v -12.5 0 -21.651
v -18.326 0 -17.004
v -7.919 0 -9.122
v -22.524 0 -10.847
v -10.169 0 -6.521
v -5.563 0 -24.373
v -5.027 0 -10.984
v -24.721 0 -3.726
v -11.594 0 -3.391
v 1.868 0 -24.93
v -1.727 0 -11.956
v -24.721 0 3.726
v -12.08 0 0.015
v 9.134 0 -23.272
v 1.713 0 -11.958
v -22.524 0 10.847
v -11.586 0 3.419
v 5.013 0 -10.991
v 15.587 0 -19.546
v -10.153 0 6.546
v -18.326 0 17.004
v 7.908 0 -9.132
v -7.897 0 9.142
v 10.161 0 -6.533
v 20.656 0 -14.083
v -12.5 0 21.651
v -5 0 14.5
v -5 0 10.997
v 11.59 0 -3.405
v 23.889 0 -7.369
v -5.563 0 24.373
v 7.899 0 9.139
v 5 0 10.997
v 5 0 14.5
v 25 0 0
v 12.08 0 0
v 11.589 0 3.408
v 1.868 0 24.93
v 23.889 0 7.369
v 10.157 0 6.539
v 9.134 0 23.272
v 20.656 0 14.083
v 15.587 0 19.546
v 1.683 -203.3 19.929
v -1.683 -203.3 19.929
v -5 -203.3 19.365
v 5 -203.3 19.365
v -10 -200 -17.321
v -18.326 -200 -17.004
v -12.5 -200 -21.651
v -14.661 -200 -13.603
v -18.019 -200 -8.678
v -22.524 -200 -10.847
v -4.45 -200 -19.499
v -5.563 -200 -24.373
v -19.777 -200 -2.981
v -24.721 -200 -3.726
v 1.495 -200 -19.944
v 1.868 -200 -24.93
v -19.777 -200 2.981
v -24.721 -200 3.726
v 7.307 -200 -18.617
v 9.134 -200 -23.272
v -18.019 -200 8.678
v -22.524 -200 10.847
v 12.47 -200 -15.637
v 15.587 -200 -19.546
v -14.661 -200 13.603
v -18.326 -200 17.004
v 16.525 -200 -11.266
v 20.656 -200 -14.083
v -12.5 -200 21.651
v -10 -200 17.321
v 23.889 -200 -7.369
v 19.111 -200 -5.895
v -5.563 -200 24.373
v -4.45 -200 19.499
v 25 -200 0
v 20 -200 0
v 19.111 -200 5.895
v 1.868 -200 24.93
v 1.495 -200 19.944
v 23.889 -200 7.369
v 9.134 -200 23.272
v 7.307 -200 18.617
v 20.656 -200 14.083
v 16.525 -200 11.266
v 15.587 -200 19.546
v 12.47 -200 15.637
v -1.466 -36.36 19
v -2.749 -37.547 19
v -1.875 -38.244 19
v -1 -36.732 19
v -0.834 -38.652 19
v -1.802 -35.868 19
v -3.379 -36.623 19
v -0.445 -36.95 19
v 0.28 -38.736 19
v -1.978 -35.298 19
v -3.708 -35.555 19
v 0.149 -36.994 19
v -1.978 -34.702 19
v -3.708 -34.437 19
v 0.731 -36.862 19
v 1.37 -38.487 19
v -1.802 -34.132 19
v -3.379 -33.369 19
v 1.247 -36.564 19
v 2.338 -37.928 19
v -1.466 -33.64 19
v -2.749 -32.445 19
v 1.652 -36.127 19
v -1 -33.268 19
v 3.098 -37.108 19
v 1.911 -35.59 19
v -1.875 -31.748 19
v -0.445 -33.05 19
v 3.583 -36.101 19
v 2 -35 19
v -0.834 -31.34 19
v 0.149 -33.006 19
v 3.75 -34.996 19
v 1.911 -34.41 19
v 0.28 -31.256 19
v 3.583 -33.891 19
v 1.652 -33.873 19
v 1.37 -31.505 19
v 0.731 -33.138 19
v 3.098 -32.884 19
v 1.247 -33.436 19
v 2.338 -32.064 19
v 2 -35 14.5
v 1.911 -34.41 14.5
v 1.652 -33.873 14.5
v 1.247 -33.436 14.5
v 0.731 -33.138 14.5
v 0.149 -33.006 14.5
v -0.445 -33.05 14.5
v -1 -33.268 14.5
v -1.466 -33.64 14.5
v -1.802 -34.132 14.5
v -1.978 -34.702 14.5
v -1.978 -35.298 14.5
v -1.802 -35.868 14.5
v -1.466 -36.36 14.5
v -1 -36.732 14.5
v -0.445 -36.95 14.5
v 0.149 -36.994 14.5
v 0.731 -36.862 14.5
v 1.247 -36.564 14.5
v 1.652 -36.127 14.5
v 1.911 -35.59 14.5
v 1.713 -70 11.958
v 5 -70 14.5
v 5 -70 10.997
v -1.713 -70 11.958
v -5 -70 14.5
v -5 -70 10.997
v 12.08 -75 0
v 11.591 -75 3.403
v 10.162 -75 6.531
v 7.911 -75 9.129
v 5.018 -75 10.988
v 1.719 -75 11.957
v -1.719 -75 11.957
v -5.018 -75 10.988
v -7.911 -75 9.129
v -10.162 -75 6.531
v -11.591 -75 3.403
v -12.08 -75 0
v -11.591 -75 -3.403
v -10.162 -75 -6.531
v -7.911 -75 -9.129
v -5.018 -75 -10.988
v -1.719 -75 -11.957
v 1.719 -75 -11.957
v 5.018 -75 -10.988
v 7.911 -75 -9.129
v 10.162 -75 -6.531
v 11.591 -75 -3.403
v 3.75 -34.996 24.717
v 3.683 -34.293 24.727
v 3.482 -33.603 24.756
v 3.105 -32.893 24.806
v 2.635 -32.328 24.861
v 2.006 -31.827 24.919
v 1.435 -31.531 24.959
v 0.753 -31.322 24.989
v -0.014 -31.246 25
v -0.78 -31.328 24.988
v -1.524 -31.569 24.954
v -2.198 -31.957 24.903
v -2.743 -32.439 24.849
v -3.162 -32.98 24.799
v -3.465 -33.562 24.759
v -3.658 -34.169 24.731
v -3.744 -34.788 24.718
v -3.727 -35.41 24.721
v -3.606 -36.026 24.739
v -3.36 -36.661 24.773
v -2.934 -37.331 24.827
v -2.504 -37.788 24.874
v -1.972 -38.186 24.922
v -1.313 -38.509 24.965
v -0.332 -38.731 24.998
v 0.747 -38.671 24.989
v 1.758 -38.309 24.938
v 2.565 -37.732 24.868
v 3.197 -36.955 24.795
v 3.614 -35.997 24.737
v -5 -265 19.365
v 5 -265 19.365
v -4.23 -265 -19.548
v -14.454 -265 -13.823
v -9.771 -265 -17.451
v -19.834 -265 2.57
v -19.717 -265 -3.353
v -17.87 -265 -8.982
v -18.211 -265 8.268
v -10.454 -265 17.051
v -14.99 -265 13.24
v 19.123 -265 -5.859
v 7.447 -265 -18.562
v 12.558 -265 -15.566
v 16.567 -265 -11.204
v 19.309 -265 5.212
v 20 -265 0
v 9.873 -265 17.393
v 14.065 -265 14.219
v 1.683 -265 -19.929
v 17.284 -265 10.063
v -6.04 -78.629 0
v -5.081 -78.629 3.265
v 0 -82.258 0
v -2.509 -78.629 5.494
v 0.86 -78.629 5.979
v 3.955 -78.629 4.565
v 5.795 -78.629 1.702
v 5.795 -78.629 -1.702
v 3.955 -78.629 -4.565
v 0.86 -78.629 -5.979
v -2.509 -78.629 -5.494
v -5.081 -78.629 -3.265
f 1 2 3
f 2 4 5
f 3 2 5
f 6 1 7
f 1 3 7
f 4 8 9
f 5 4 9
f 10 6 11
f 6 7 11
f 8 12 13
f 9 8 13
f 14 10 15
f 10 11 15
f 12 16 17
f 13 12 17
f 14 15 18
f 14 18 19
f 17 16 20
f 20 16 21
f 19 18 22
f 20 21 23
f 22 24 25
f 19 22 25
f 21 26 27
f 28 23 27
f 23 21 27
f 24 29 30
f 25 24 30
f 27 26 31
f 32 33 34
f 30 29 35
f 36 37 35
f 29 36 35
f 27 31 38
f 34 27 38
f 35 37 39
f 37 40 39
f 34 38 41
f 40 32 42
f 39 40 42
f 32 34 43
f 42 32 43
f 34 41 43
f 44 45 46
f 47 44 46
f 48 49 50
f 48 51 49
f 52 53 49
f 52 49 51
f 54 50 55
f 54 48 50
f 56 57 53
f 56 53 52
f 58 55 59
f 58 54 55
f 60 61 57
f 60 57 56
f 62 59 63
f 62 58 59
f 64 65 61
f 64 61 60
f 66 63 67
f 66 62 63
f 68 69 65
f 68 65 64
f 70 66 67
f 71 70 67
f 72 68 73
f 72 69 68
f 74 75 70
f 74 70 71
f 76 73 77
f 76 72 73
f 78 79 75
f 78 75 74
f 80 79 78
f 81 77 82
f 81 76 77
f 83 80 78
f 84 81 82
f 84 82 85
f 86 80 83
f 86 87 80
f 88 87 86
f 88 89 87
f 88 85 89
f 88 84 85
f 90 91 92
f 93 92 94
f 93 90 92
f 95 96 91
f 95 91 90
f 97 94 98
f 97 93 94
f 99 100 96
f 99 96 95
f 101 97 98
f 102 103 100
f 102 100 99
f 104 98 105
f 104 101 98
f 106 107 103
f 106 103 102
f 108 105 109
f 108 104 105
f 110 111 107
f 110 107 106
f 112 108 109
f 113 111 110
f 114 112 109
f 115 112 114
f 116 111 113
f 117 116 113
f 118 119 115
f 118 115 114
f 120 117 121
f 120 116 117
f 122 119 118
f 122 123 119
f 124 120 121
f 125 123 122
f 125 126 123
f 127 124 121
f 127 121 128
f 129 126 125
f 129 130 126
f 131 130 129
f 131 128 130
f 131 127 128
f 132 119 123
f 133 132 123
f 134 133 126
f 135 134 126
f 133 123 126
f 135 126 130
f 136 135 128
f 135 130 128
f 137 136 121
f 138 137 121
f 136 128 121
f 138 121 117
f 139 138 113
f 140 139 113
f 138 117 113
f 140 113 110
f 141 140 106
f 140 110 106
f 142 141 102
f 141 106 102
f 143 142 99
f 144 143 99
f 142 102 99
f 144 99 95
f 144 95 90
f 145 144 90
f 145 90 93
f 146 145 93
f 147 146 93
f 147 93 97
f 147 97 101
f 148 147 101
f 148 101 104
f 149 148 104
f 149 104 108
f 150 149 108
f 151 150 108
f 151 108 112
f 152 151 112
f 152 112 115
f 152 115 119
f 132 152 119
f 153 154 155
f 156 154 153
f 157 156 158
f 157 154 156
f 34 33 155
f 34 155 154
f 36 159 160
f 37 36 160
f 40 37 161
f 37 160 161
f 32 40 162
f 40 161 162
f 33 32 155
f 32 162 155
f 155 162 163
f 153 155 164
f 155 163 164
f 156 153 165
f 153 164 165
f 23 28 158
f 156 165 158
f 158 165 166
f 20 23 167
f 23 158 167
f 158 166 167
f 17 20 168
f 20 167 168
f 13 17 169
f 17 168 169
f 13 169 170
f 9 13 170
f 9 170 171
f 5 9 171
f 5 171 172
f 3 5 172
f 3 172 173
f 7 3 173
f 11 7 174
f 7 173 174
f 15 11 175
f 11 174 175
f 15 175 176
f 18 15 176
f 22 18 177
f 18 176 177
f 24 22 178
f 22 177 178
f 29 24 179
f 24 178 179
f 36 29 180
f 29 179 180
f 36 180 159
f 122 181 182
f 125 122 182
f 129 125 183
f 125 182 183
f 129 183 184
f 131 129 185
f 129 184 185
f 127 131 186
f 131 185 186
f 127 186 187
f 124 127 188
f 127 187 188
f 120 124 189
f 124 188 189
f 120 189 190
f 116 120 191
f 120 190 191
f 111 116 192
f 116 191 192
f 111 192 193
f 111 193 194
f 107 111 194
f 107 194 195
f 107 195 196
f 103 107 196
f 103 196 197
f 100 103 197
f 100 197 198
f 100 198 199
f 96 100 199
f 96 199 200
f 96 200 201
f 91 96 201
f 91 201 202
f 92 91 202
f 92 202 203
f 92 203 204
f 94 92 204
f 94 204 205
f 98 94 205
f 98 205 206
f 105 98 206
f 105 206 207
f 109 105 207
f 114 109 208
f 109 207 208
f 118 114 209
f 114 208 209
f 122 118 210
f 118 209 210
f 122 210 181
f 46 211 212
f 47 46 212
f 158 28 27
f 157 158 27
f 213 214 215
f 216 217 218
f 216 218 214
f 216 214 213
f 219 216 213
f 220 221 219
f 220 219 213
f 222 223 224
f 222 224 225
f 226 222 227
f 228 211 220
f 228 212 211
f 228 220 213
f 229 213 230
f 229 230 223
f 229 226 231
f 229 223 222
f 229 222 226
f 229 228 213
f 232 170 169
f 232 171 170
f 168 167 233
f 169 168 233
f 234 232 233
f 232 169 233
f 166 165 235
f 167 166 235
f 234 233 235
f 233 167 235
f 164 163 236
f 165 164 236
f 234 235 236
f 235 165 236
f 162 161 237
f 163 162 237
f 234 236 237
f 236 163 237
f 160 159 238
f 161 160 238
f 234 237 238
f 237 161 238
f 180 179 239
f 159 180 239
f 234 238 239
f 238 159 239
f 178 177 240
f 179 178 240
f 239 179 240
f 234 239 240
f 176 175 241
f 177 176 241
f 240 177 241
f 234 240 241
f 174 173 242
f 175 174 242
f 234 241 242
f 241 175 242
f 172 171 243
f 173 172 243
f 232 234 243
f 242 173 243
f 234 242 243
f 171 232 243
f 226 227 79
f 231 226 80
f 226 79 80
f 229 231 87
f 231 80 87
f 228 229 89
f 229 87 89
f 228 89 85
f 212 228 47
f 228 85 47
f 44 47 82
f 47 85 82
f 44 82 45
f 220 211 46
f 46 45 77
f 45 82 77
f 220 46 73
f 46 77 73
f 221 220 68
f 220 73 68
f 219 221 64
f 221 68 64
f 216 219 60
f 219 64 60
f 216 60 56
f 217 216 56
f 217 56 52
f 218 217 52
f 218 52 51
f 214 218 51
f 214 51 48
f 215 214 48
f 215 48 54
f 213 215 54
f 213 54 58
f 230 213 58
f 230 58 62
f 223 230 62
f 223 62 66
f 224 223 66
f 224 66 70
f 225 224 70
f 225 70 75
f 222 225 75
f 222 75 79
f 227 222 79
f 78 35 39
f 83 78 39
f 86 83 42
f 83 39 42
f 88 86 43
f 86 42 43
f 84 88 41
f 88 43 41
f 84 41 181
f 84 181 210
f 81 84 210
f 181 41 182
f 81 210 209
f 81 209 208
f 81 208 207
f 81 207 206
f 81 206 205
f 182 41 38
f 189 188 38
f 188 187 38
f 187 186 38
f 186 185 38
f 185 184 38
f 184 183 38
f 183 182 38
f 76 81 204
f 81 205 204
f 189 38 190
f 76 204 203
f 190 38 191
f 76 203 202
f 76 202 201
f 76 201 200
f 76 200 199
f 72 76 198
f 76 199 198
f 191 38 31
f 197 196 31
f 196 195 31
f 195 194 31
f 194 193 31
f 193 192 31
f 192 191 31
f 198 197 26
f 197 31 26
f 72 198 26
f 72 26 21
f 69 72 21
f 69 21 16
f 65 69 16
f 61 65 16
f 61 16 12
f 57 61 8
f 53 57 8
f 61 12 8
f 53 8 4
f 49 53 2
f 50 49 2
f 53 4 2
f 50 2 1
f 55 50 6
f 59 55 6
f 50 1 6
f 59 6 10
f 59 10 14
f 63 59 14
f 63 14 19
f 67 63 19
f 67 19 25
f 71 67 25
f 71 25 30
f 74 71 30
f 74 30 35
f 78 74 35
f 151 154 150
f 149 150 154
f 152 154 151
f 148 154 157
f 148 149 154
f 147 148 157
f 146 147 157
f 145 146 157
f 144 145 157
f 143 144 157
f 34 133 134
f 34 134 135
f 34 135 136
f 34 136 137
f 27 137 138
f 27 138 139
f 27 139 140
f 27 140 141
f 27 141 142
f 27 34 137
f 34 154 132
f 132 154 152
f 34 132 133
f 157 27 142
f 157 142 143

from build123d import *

# Parameters (mm, degrees)
F0_R      = 25
F1_DEPTH  = 200
F2_R      = 20
F3_DEPTH  = 65
F4_W      = 10
F4_H      = 3.1937984634
F5_DEPTH  = 61.7
F7_D      = 24.16
F7_DEPTH  = 75
F7_TIP    = 7.2583962779
F8_W      = 10
F8_H      = 5.6645046324
F9_DEPTH  = 70
F11_R     = 2
F12_DEPTH = 25
F13_R     = 3.75
F14_DEPTH = 6


with BuildPart() as f1:
    # F0 (on Front) → F1 (new body)
    with BuildSketch(Plane.XZ):
        Circle(F0_R)
    extrude(amount=F1_DEPTH)

    # F2 (on face) → F3 (join)
    with BuildSketch(Plane.XZ.offset(200)):
        Circle(F2_R)
    extrude(amount=F3_DEPTH)

    # F4 (on face) → F5 (cut)
    with BuildSketch(Plane.XZ.offset(265)):
        with Locations((0, 20.9618159628)):
            Rectangle(F4_W, F4_H)
    extrude(amount=-F5_DEPTH, mode=Mode.SUBTRACT)

    # F7
    with Locations(Plane(origin=(0, 0, 0), x_dir=(-1, 0, 0), z_dir=(0, 1, 0))):
        with Locations((0, 0)):
            Hole(F7_D / 2, depth=F7_DEPTH)
            with Locations((0, 0, -(F7_DEPTH + F7_TIP / 2))):  # 118° drill point
                Cone(0, F7_D / 2, F7_TIP, mode=Mode.SUBTRACT)

    # F8 (on face) → F9 (cut)
    with BuildSketch(Plane(origin=(0, 0, 0), x_dir=(-1, 0, 0), z_dir=(0, 1, 0))):
        with Locations((0, 11.6677476838)):
            Rectangle(F8_W, F8_H)
    extrude(amount=-F9_DEPTH, mode=Mode.SUBTRACT)

    # F11 (on offset) → F12 (cut)
    with BuildSketch(Plane.XY.offset(25)):
        with Locations((0, -35)):
            Circle(F11_R)
    extrude(amount=-F12_DEPTH, mode=Mode.SUBTRACT)

    # F13 (on offset) → F14 (cut)
    with BuildSketch(Plane.XY.offset(25)):
        with Locations((0, -34.9959954619)):
            Circle(F13_R)
    extrude(amount=-F14_DEPTH, mode=Mode.SUBTRACT)


solid = f1.part
